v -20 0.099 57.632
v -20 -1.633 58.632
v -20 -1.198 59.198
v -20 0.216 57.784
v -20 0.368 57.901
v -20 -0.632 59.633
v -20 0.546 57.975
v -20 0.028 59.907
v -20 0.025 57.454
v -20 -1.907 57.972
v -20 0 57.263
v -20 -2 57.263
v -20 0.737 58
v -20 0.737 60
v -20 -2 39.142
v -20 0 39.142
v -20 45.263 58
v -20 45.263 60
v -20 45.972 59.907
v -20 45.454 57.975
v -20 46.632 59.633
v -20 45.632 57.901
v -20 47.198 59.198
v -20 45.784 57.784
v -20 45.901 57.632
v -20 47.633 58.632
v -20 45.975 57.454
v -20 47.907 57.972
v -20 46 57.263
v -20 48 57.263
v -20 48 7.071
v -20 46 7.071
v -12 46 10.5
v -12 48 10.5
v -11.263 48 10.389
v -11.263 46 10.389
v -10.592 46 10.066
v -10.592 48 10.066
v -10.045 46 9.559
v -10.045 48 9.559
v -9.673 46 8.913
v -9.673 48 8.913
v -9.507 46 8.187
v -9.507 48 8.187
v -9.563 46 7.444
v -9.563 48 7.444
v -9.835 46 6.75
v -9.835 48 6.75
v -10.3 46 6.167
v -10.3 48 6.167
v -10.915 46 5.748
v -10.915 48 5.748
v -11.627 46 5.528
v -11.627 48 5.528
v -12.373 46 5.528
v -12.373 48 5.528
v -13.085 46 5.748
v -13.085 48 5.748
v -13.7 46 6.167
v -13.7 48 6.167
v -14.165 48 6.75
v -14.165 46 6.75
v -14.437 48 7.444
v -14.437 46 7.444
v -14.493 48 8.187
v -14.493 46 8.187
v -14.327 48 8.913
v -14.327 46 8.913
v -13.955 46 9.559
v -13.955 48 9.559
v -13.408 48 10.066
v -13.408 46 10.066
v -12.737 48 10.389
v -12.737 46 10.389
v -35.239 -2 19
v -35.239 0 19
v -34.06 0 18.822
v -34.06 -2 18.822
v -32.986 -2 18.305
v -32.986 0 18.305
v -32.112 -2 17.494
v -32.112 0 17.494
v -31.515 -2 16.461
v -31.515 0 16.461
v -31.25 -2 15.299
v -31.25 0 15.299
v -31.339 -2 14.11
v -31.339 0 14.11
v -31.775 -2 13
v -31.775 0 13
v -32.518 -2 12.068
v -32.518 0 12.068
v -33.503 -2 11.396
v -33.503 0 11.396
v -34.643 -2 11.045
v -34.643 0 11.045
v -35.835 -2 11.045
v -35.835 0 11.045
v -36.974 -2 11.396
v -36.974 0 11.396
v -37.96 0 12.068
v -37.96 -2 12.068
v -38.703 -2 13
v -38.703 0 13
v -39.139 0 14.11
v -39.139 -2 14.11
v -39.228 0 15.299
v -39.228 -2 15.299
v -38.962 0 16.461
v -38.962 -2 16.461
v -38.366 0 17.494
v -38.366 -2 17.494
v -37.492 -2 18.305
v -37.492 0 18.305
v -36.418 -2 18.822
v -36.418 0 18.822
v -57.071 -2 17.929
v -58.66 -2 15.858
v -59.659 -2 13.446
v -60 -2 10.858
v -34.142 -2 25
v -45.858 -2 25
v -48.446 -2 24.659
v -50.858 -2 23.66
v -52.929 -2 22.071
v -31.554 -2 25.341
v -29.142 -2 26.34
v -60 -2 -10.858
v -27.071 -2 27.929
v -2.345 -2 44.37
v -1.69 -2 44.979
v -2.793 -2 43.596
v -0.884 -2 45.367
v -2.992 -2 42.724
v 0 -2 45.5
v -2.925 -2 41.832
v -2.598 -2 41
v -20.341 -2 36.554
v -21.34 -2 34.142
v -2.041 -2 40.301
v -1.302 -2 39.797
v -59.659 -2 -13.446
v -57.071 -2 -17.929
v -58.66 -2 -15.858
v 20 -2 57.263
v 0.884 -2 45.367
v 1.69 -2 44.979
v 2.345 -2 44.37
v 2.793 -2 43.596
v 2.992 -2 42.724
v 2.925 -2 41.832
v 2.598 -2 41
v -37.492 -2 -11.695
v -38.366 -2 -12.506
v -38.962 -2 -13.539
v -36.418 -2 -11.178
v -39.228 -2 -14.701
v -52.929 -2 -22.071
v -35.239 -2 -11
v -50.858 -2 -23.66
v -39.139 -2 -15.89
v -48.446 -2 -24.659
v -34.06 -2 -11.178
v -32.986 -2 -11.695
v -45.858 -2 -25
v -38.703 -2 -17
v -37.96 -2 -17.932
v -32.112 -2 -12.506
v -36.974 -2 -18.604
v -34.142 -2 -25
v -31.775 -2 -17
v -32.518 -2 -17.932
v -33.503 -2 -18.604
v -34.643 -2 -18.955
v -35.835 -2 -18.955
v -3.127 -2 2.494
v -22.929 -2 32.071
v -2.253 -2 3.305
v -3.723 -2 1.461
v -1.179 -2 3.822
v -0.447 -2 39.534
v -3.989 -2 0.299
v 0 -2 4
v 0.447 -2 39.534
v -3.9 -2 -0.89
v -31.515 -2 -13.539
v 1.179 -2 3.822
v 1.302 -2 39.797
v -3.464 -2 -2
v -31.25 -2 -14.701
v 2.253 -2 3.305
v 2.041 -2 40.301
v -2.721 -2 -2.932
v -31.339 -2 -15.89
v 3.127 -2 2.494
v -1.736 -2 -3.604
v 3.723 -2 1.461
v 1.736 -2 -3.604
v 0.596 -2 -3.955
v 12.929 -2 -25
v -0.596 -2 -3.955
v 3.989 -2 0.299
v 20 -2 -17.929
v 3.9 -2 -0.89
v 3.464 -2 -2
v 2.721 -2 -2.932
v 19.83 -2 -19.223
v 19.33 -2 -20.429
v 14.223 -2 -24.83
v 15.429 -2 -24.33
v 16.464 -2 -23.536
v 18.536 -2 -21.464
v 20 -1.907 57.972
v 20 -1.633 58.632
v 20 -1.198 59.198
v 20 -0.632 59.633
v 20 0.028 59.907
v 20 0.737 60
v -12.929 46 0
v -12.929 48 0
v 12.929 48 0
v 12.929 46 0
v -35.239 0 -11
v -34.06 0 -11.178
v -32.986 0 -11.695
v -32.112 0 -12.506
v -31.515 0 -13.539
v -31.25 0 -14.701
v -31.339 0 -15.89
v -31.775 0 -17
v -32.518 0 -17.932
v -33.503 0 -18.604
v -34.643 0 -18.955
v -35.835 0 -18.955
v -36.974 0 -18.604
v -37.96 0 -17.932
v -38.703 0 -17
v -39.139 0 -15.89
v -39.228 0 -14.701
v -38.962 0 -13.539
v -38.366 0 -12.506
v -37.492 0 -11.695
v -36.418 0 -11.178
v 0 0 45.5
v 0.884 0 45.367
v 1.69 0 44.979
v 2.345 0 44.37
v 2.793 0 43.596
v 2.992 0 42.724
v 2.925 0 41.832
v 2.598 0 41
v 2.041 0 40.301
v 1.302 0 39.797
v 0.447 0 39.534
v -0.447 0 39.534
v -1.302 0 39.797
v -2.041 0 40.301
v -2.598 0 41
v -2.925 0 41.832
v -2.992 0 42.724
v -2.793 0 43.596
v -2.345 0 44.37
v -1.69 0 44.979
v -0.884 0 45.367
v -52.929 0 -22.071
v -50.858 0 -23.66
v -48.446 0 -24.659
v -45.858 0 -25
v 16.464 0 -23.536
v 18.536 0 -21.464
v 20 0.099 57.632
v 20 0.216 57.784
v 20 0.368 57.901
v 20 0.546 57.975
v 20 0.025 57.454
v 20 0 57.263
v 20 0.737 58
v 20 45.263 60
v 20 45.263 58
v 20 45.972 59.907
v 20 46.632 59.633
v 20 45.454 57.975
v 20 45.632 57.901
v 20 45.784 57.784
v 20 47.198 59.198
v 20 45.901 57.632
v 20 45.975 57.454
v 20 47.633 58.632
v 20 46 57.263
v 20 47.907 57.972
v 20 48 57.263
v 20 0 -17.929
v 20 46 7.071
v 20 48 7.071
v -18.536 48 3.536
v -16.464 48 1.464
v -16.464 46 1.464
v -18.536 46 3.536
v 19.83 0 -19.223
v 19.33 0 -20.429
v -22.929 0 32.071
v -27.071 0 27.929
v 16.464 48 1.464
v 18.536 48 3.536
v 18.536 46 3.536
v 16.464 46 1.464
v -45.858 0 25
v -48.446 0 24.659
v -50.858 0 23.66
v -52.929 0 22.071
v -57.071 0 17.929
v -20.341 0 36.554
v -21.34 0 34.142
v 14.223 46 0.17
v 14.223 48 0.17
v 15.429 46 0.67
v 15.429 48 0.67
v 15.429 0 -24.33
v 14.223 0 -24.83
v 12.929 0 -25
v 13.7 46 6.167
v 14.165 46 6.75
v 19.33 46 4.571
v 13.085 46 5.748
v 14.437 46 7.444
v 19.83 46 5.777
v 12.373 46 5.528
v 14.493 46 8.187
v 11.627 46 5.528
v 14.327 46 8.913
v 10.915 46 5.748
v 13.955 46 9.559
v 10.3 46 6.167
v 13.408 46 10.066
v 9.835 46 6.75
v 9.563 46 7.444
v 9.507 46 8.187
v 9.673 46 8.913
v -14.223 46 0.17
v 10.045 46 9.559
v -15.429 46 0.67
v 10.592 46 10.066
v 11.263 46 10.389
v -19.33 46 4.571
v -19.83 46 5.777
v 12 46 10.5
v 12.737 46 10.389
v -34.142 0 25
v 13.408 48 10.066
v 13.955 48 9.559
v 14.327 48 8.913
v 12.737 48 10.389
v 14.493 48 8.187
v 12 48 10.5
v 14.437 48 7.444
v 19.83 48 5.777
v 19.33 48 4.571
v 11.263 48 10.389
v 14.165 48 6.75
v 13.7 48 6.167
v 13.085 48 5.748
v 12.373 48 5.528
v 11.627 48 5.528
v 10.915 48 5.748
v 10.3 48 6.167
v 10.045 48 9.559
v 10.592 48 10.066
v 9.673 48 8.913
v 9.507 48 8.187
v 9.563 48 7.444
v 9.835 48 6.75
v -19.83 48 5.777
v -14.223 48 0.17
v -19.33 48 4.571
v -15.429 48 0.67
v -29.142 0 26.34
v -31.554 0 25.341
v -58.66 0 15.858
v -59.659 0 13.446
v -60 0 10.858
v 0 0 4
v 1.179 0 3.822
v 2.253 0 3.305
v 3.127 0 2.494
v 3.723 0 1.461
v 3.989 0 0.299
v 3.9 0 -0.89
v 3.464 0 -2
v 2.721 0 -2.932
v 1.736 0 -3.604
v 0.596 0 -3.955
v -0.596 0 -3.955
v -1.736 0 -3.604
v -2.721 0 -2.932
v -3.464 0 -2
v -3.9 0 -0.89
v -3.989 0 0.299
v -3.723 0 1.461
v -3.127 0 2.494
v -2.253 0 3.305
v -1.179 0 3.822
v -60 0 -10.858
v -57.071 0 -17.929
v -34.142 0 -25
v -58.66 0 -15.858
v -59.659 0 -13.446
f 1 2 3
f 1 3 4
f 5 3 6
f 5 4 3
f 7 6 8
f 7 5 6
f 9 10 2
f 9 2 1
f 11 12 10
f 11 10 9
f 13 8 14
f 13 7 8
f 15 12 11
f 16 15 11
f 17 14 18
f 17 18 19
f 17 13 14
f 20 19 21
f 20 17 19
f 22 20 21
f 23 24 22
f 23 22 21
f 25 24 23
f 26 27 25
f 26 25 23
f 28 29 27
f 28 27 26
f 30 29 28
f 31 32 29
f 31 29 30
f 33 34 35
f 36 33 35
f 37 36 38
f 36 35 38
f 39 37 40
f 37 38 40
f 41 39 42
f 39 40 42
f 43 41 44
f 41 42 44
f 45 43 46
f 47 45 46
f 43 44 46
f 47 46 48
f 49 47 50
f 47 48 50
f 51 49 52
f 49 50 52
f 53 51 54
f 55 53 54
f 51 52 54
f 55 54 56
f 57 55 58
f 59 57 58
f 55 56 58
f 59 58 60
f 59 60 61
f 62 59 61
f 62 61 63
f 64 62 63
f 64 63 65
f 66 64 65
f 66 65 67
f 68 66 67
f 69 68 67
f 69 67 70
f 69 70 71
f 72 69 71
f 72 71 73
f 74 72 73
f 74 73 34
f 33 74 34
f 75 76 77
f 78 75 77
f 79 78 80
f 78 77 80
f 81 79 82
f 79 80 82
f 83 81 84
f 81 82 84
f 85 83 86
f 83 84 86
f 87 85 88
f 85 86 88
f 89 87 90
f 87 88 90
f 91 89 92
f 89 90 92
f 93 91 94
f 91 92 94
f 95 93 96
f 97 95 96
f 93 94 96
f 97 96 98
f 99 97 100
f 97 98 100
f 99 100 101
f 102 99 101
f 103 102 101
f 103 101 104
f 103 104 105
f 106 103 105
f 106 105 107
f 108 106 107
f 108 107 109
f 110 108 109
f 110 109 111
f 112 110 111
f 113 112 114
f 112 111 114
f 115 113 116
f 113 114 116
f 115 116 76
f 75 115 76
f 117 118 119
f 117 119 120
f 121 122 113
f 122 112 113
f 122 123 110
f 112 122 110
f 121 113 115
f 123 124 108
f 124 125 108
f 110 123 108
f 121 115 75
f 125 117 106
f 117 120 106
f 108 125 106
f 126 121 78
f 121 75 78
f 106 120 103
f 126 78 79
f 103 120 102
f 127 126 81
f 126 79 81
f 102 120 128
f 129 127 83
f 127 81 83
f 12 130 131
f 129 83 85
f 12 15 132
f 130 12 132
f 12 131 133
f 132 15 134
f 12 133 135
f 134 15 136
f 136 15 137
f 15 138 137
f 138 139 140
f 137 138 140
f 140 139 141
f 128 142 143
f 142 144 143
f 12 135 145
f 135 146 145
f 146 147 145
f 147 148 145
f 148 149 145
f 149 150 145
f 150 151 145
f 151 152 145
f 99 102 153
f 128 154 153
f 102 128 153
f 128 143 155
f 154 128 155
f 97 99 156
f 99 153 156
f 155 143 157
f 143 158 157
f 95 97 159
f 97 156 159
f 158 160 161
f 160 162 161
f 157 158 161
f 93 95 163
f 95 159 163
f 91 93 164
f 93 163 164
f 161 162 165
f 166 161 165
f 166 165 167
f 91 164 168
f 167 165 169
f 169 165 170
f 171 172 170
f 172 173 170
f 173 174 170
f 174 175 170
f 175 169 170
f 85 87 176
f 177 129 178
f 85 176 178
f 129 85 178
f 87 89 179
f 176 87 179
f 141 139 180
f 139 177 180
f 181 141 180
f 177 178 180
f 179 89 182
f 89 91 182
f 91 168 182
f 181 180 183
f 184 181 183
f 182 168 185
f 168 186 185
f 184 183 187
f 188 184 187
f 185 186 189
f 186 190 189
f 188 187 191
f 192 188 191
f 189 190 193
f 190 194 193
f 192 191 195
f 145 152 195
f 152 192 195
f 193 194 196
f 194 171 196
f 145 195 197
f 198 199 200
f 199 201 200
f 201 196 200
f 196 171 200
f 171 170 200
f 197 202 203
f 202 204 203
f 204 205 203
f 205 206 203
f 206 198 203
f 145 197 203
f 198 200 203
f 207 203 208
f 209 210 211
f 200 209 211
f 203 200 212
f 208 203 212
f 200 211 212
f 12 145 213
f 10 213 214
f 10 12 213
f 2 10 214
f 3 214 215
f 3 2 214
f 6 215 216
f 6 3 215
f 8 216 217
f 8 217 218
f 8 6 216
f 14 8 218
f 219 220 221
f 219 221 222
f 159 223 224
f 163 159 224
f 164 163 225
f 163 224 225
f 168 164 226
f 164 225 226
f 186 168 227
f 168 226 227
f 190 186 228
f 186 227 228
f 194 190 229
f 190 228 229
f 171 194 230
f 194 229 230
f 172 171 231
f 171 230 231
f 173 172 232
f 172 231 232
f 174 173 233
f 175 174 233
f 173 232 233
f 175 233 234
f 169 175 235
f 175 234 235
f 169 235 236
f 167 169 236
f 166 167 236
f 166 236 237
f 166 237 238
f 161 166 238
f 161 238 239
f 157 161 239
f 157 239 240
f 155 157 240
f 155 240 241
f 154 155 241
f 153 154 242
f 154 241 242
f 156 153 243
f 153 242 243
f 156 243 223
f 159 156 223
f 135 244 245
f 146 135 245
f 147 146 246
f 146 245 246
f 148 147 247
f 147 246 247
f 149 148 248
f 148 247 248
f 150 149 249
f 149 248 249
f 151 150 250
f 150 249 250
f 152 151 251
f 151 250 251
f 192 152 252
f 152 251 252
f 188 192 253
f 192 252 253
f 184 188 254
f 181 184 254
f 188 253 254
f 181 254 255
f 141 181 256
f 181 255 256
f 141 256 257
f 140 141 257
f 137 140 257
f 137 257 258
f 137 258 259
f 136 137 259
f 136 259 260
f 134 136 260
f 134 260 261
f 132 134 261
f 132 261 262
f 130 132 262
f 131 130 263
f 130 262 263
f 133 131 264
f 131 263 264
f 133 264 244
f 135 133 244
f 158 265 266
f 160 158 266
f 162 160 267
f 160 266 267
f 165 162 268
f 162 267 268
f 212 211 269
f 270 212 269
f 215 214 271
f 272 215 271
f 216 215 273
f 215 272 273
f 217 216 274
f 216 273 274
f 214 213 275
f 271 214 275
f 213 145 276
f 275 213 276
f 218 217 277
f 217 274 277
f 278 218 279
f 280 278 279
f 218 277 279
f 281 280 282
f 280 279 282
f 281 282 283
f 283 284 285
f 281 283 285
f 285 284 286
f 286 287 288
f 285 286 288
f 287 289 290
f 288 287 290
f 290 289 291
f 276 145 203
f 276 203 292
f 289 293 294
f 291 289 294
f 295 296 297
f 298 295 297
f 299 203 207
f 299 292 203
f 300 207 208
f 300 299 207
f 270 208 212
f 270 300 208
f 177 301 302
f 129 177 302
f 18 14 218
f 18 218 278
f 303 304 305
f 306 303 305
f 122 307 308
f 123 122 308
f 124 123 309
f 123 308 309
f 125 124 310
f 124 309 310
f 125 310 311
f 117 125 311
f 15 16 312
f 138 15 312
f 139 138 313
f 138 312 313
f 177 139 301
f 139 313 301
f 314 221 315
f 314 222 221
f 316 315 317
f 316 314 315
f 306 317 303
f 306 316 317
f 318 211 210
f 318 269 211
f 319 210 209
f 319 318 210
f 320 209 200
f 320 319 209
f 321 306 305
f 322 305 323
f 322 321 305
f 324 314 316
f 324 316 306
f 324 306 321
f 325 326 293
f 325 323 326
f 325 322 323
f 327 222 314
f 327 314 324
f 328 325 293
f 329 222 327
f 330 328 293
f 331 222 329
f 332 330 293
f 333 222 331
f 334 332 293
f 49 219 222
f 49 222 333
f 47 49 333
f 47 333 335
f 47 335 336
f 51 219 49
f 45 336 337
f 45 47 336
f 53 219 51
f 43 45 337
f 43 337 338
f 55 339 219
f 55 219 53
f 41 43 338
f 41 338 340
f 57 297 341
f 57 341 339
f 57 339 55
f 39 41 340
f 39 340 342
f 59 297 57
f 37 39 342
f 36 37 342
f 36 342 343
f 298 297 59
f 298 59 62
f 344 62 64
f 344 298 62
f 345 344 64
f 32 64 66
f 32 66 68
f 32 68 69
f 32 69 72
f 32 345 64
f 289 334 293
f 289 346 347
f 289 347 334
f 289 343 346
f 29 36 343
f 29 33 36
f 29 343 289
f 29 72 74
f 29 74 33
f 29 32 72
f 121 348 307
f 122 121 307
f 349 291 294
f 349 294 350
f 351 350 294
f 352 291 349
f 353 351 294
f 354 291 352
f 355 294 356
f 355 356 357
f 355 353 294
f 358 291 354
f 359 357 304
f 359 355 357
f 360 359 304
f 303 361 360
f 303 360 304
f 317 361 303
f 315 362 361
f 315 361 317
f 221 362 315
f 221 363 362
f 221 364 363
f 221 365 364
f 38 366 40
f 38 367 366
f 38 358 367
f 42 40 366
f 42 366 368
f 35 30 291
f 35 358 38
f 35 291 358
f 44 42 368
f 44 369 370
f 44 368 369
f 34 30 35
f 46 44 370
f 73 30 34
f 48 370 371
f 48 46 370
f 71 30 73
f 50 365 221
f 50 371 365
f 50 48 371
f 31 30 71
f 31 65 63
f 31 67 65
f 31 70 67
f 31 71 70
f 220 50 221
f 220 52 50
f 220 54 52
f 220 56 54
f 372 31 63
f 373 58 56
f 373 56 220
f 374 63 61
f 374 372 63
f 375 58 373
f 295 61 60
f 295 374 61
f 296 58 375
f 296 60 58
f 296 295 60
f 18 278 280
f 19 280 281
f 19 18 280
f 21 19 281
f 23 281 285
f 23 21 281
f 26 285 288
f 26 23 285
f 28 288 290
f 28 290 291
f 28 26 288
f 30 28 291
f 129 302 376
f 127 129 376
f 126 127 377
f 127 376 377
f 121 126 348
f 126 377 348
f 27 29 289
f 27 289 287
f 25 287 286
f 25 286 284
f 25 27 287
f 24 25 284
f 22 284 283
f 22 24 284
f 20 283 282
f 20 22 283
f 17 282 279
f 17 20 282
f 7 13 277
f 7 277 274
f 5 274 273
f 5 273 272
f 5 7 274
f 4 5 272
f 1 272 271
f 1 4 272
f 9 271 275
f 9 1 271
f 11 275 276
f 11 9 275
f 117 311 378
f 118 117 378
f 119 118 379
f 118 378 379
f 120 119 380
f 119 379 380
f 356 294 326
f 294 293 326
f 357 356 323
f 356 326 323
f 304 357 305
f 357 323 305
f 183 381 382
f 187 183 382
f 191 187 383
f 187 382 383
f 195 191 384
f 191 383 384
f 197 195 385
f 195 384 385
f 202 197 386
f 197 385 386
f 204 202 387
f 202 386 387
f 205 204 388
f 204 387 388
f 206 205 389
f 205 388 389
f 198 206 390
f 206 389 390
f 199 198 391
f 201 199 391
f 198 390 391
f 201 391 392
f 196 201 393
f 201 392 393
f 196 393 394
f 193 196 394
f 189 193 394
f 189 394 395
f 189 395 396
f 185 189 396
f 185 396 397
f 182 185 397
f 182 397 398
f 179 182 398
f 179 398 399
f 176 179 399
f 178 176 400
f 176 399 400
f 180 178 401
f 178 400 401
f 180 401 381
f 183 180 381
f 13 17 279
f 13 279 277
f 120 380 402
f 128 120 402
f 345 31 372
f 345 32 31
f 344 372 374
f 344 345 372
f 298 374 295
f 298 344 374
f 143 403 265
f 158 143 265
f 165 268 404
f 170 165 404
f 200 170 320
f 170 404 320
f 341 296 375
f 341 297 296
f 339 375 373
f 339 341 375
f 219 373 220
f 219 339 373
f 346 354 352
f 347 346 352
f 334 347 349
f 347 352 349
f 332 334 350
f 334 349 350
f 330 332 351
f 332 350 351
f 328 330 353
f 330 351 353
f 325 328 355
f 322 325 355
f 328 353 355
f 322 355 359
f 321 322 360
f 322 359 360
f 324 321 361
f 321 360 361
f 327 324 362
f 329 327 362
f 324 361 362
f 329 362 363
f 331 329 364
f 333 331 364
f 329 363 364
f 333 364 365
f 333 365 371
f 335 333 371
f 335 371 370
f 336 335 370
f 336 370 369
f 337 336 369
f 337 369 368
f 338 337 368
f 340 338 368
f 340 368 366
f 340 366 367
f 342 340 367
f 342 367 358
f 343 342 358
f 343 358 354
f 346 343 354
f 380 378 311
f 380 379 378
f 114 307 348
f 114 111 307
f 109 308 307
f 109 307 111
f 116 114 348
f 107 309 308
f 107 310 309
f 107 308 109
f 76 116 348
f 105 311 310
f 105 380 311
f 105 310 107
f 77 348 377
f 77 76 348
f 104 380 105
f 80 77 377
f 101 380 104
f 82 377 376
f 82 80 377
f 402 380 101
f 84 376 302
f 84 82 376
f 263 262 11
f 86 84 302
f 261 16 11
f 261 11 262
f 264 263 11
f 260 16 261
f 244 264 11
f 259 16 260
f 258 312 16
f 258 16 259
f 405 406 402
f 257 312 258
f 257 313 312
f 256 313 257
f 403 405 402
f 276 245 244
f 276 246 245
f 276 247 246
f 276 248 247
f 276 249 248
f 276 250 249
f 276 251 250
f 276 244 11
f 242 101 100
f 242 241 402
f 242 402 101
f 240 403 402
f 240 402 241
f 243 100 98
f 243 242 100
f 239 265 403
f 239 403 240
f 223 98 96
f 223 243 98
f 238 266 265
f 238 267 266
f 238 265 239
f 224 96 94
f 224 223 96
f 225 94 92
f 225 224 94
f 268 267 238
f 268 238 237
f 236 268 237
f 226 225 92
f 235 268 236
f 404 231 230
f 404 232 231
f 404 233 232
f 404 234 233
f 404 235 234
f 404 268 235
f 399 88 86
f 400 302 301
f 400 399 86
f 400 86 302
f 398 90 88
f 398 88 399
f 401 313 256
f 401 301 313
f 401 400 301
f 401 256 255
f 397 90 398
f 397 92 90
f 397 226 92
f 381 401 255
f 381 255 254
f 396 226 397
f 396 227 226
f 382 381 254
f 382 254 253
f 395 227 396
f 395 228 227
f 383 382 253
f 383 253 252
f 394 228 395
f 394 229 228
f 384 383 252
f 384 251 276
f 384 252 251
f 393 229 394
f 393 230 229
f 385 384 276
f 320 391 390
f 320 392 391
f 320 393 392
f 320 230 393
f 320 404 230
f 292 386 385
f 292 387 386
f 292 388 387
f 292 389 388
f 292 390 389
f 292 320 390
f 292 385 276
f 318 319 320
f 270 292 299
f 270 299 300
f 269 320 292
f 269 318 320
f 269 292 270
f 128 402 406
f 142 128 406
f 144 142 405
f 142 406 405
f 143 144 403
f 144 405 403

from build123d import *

# Parameters (mm, degrees)
SKETCH1_R                    = 3
SKETCH1_R_2                  = 4
BASE_FLANGE1_DEPTH           = 2
SKETCH6_W                    = 90.588867986
SKETCH6_H                    = 42.612496281
CUT_EXTRUDE1_DEPTH           = 10
DELETEFACE2_START            = -2
DELETEFACE2_DEPTH            = 2
DELETEFACE3_START            = 50
DELETEFACE3_OUTLINE_W        = 40
DELETEFACE3_OUTLINE_H        = 2
DELETEFACE3_DEPTH            = 10
EDGE_FLANGE1_STRIP_W         = 9.4732
EDGE_FLANGE1_STRIP_H         = 2
EDGE_FLANGE1_STRIP_CUT_DEPTH = 40
EDGE_FLANGE1_DEPTH           = 40
EDGE_FLANGE2_STRIP_W         = 9.4732
EDGE_FLANGE2_STRIP_H         = 2
EDGE_FLANGE2_STRIP_CUT_DEPTH = 40
EDGE_FLANGE2_DEPTH           = 40
SKETCH15_R                   = 2.5
CUT_EXTRUDE2_DEPTH           = 10
CHAMFER1_SIZE                = 5
FILLET1_R                    = 5


# Read off the part's stored shape, not the designer's step: DeleteFace2, DeleteFace3
# Sheet-metal steps are written as plain solids
with BuildPart() as part:
    # Sketch1 → Base-Flange1 (new body)
    with BuildSketch(Plane(origin=(0, 0, 0), x_dir=(1, 0, 0), z_dir=(0, 1, 0))):
        with BuildLine():
            Line((-17.071067812, 52.928932188), (-12.928932188, 57.071067812))
            ThreePointArc((-12.928932188, 57.071067812), (-9.6846987, 59.238795325), (-5.857864376, 60))
            Line((-5.857864376, 60), (5.857864376, 60))
            ThreePointArc((5.857864376, 60), (9.6846987, 59.238795325), (12.928932188, 57.071067812))
            Line((12.928932188, 57.071067812), (17.071067812, 52.928932188))
            ThreePointArc((17.071067812, 52.928932188), (19.238795325, 49.6846987), (20, 45.857864376))
            Line((20, 45.857864376), (20, -45.857864376))
            ThreePointArc((20, -45.857864376), (19.238795325, -49.6846987), (17.071067812, -52.928932188))
            Line((17.071067812, -52.928932188), (12.928932188, -57.071067812))
            ThreePointArc((12.928932188, -57.071067812), (9.6846987, -59.238795325), (5.857864376, -60))
            Line((5.857864376, -60), (-5.857864376, -60))
            ThreePointArc((-5.857864376, -60), (-9.6846987, -59.238795325), (-12.928932188, -57.071067812))
            Line((-12.928932188, -57.071067812), (-17.071067812, -52.928932188))
            ThreePointArc((-17.071067812, -52.928932188), (-19.238795325, -49.6846987), (-20, -45.857864376))
            Line((-20, -45.857864376), (-20, -39.142135624))
            ThreePointArc((-20, -39.142135624), (-20.761204675, -35.3153013), (-22.928932188, -32.071067812))
            Line((-22.928932188, -32.071067812), (-27.071067812, -27.928932188))
            ThreePointArc((-27.071067812, -27.928932188), (-30.3153013, -25.761204675), (-34.142135624, -25))
            Line((-34.142135624, -25), (-45.857864376, -25))
            ThreePointArc((-45.857864376, -25), (-49.6846987, -24.238795325), (-52.928932188, -22.071067812))
            Line((-52.928932188, -22.071067812), (-57.071067812, -17.928932188))
            ThreePointArc((-57.071067812, -17.928932188), (-59.238795325, -14.6846987), (-60, -10.857864376))
            Line((-60, -10.857864376), (-60, 10.857864376))
            ThreePointArc((-60, 10.857864376), (-59.238795325, 14.6846987), (-57.071067812, 17.928932188))
            Line((-57.071067812, 17.928932188), (-52.928932188, 22.071067812))
            ThreePointArc((-52.928932188, 22.071067812), (-49.6846987, 24.238795325), (-45.857864376, 25))
            Line((-45.857864376, 25), (-34.142135624, 25))
            ThreePointArc((-34.142135624, 25), (-30.3153013, 25.761204675), (-27.071067812, 27.928932188))
            Line((-27.071067812, 27.928932188), (-22.928932188, 32.071067812))
            ThreePointArc((-22.928932188, 32.071067812), (-20.761204675, 35.3153013), (-20, 39.142135624))
            Line((-20, 39.142135624), (-20, 45.857864376))
            ThreePointArc((-20, 45.857864376), (-19.238795325, 49.6846987), (-17.071067812, 52.928932188))
        make_face()
        with Locations(Location((0, 42.5, 0), (0, 0, 270))):
            Circle(SKETCH1_R, mode=Mode.SUBTRACT)
        with Locations(Location((0, -42.5, 0), (0, 0, 270))):
            Circle(SKETCH1_R, mode=Mode.SUBTRACT)
        with Locations(Location((0, 0, 0), (0, 0, 270))):
            Circle(SKETCH1_R_2, mode=Mode.SUBTRACT)
        with Locations(Location((-35.23885867, -15, 0), (0, 0, 270))):
            Circle(SKETCH1_R_2, mode=Mode.SUBTRACT)
        with Locations(Location((-35.23885867, 15, 0), (0, 0, 270))):
            Circle(SKETCH1_R_2, mode=Mode.SUBTRACT)
    extrude(amount=-BASE_FLANGE1_DEPTH)

    # Sketch6 → Cut-Extrude1 (cut)
    with BuildSketch(Plane(origin=(0, 0, 0), x_dir=(1, 0, 0), z_dir=(0, 1, 0))):
        with Locations((11.152298369, 46.306248141)):
            Rectangle(SKETCH6_W, SKETCH6_H)
    extrude(amount=-CUT_EXTRUDE1_DEPTH, mode=Mode.SUBTRACT)

    # DeleteFace2 outline → DeleteFace2 (add)
    with BuildSketch(Plane(origin=(0, 0, 0), x_dir=(1, 0, 0), z_dir=(0, 1, 0)).offset(DELETEFACE2_START)):
        with BuildLine():
            Line((5.857864376, -60), (10, -60))
            Line((10, -60), (12.928932188, -57.071067812))
            ThreePointArc((12.928932188, -57.071067812), (9.6846987, -59.238795325), (5.857864376, -60))
        make_face()
        with BuildLine():
            Line((-20, -50), (-17.071067812, -52.928932188))
            ThreePointArc((-17.071067812, -52.928932188), (-19.238795325, -49.6846987), (-20, -45.857864376))
            Line((-20, -45.857864376), (-20, -50))
        make_face()
        with BuildLine():
            Line((-10, -60), (-5.857864376, -60))
            ThreePointArc((-5.857864376, -60), (-9.6846987, -59.238795325), (-12.928932188, -57.071067812))
            Line((-12.928932188, -57.071067812), (-10, -60))
        make_face()
        with BuildLine():
            ThreePointArc((20, -45.857864376), (19.238795325, -49.6846987), (17.071067812, -52.928932188))
            Line((17.071067812, -52.928932188), (20, -50))
            Line((20, -50), (20, -45.857864376))
        make_face()
    extrude(amount=DELETEFACE2_DEPTH)

    # DeleteFace3 outline → DeleteFace3 (add)
    with BuildSketch(Plane.XY.offset(DELETEFACE3_START)):
        with Locations((0, -1)):
            Rectangle(DELETEFACE3_OUTLINE_W, DELETEFACE3_OUTLINE_H)
    extrude(amount=DELETEFACE3_DEPTH)

    # Edge-Flange1 strip (across the edge) → Edge-Flange1 strip cut (cut)
    with BuildSketch(Plane(origin=(-20, 0, 60), x_dir=(0, 0, -1), z_dir=(1, 0, 0))):
        with Locations((-2, -1)):
            Rectangle(EDGE_FLANGE1_STRIP_W, EDGE_FLANGE1_STRIP_H)
    extrude(amount=EDGE_FLANGE1_STRIP_CUT_DEPTH, mode=Mode.SUBTRACT)

    # Edge-Flange1 section (across the edge) → Edge-Flange1 (add)
    with BuildSketch(Plane(origin=(-20, 0, 60), x_dir=(0, 0, -1), z_dir=(1, 0, 0))):
        with BuildLine():
            Line((0, 0.7366), (0, 48))
            Line((0, 48), (2, 48))
            Line((2, 48), (2, 0.7366))
            ThreePointArc((2, 0.7366), (2.215745145, 0.215745145), (2.7366, 0))
            Line((2.7366, 0), (2.7366, -2))
            ThreePointArc((2.7366, -2), (0.801531583, -1.198468417), (0, 0.7366))
        make_face()
    extrude(amount=EDGE_FLANGE1_DEPTH)

    # Edge-Flange2 strip (across the edge) → Edge-Flange2 strip cut (cut)
    with BuildSketch(Plane(origin=(-20, 48, 58), x_dir=(0, -1, 0), z_dir=(1, 0, 0))):
        with Locations((-2, -1)):
            Rectangle(EDGE_FLANGE2_STRIP_W, EDGE_FLANGE2_STRIP_H)
    extrude(amount=EDGE_FLANGE2_STRIP_CUT_DEPTH, mode=Mode.SUBTRACT)

    # Edge-Flange2 section (across the edge) → Edge-Flange2 (add)
    with BuildSketch(Plane(origin=(-20, 48, 58), x_dir=(0, -1, 0), z_dir=(1, 0, 0))):
        with BuildLine():
            Line((0, 0.7366), (0, 58))
            Line((0, 58), (2, 58))
            Line((2, 58), (2, 0.7366))
            ThreePointArc((2, 0.7366), (2.215745145, 0.215745145), (2.7366, 0))
            Line((2.7366, 0), (2.7366, -2))
            ThreePointArc((2.7366, -2), (0.801531583, -1.198468417), (0, 0.7366))
        make_face()
    extrude(amount=EDGE_FLANGE2_DEPTH)

    # Sketch15 → Cut-Extrude2 (cut)
    with BuildSketch(Plane(origin=(0, 48, 0), x_dir=(1, 0, 0), z_dir=(0, 1, 0))):
        with Locations(Location((-12, -8, 0), (0, 0, 270))):
            Circle(SKETCH15_R)
        with Locations(Location((12, -8, 0), (0, 0, 270))):
            Circle(SKETCH15_R)
    extrude(amount=-CUT_EXTRUDE2_DEPTH, mode=Mode.SUBTRACT)

    # Chamfer1
    chamfer1_edges = [part.edges().sort_by_distance(p)[0] for p in [
        (20, -1, -25),
        (-20, 47, 0),
        (20, 47, 0),
    ]]
    chamfer(chamfer1_edges, length=CHAMFER1_SIZE)

    # Fillet1
    fillet1_edges = [part.edges().sort_by_distance(p)[0] for p in [
        (15, -1, -25),
        (20, -1, -20),
        (-15, 47, 0),
        (15, 47, 0),
        (20, 47, 5),
        (-20, 47, 5),
    ]]
    fillet(fillet1_edges, radius=FILLET1_R)


solid = part.part
